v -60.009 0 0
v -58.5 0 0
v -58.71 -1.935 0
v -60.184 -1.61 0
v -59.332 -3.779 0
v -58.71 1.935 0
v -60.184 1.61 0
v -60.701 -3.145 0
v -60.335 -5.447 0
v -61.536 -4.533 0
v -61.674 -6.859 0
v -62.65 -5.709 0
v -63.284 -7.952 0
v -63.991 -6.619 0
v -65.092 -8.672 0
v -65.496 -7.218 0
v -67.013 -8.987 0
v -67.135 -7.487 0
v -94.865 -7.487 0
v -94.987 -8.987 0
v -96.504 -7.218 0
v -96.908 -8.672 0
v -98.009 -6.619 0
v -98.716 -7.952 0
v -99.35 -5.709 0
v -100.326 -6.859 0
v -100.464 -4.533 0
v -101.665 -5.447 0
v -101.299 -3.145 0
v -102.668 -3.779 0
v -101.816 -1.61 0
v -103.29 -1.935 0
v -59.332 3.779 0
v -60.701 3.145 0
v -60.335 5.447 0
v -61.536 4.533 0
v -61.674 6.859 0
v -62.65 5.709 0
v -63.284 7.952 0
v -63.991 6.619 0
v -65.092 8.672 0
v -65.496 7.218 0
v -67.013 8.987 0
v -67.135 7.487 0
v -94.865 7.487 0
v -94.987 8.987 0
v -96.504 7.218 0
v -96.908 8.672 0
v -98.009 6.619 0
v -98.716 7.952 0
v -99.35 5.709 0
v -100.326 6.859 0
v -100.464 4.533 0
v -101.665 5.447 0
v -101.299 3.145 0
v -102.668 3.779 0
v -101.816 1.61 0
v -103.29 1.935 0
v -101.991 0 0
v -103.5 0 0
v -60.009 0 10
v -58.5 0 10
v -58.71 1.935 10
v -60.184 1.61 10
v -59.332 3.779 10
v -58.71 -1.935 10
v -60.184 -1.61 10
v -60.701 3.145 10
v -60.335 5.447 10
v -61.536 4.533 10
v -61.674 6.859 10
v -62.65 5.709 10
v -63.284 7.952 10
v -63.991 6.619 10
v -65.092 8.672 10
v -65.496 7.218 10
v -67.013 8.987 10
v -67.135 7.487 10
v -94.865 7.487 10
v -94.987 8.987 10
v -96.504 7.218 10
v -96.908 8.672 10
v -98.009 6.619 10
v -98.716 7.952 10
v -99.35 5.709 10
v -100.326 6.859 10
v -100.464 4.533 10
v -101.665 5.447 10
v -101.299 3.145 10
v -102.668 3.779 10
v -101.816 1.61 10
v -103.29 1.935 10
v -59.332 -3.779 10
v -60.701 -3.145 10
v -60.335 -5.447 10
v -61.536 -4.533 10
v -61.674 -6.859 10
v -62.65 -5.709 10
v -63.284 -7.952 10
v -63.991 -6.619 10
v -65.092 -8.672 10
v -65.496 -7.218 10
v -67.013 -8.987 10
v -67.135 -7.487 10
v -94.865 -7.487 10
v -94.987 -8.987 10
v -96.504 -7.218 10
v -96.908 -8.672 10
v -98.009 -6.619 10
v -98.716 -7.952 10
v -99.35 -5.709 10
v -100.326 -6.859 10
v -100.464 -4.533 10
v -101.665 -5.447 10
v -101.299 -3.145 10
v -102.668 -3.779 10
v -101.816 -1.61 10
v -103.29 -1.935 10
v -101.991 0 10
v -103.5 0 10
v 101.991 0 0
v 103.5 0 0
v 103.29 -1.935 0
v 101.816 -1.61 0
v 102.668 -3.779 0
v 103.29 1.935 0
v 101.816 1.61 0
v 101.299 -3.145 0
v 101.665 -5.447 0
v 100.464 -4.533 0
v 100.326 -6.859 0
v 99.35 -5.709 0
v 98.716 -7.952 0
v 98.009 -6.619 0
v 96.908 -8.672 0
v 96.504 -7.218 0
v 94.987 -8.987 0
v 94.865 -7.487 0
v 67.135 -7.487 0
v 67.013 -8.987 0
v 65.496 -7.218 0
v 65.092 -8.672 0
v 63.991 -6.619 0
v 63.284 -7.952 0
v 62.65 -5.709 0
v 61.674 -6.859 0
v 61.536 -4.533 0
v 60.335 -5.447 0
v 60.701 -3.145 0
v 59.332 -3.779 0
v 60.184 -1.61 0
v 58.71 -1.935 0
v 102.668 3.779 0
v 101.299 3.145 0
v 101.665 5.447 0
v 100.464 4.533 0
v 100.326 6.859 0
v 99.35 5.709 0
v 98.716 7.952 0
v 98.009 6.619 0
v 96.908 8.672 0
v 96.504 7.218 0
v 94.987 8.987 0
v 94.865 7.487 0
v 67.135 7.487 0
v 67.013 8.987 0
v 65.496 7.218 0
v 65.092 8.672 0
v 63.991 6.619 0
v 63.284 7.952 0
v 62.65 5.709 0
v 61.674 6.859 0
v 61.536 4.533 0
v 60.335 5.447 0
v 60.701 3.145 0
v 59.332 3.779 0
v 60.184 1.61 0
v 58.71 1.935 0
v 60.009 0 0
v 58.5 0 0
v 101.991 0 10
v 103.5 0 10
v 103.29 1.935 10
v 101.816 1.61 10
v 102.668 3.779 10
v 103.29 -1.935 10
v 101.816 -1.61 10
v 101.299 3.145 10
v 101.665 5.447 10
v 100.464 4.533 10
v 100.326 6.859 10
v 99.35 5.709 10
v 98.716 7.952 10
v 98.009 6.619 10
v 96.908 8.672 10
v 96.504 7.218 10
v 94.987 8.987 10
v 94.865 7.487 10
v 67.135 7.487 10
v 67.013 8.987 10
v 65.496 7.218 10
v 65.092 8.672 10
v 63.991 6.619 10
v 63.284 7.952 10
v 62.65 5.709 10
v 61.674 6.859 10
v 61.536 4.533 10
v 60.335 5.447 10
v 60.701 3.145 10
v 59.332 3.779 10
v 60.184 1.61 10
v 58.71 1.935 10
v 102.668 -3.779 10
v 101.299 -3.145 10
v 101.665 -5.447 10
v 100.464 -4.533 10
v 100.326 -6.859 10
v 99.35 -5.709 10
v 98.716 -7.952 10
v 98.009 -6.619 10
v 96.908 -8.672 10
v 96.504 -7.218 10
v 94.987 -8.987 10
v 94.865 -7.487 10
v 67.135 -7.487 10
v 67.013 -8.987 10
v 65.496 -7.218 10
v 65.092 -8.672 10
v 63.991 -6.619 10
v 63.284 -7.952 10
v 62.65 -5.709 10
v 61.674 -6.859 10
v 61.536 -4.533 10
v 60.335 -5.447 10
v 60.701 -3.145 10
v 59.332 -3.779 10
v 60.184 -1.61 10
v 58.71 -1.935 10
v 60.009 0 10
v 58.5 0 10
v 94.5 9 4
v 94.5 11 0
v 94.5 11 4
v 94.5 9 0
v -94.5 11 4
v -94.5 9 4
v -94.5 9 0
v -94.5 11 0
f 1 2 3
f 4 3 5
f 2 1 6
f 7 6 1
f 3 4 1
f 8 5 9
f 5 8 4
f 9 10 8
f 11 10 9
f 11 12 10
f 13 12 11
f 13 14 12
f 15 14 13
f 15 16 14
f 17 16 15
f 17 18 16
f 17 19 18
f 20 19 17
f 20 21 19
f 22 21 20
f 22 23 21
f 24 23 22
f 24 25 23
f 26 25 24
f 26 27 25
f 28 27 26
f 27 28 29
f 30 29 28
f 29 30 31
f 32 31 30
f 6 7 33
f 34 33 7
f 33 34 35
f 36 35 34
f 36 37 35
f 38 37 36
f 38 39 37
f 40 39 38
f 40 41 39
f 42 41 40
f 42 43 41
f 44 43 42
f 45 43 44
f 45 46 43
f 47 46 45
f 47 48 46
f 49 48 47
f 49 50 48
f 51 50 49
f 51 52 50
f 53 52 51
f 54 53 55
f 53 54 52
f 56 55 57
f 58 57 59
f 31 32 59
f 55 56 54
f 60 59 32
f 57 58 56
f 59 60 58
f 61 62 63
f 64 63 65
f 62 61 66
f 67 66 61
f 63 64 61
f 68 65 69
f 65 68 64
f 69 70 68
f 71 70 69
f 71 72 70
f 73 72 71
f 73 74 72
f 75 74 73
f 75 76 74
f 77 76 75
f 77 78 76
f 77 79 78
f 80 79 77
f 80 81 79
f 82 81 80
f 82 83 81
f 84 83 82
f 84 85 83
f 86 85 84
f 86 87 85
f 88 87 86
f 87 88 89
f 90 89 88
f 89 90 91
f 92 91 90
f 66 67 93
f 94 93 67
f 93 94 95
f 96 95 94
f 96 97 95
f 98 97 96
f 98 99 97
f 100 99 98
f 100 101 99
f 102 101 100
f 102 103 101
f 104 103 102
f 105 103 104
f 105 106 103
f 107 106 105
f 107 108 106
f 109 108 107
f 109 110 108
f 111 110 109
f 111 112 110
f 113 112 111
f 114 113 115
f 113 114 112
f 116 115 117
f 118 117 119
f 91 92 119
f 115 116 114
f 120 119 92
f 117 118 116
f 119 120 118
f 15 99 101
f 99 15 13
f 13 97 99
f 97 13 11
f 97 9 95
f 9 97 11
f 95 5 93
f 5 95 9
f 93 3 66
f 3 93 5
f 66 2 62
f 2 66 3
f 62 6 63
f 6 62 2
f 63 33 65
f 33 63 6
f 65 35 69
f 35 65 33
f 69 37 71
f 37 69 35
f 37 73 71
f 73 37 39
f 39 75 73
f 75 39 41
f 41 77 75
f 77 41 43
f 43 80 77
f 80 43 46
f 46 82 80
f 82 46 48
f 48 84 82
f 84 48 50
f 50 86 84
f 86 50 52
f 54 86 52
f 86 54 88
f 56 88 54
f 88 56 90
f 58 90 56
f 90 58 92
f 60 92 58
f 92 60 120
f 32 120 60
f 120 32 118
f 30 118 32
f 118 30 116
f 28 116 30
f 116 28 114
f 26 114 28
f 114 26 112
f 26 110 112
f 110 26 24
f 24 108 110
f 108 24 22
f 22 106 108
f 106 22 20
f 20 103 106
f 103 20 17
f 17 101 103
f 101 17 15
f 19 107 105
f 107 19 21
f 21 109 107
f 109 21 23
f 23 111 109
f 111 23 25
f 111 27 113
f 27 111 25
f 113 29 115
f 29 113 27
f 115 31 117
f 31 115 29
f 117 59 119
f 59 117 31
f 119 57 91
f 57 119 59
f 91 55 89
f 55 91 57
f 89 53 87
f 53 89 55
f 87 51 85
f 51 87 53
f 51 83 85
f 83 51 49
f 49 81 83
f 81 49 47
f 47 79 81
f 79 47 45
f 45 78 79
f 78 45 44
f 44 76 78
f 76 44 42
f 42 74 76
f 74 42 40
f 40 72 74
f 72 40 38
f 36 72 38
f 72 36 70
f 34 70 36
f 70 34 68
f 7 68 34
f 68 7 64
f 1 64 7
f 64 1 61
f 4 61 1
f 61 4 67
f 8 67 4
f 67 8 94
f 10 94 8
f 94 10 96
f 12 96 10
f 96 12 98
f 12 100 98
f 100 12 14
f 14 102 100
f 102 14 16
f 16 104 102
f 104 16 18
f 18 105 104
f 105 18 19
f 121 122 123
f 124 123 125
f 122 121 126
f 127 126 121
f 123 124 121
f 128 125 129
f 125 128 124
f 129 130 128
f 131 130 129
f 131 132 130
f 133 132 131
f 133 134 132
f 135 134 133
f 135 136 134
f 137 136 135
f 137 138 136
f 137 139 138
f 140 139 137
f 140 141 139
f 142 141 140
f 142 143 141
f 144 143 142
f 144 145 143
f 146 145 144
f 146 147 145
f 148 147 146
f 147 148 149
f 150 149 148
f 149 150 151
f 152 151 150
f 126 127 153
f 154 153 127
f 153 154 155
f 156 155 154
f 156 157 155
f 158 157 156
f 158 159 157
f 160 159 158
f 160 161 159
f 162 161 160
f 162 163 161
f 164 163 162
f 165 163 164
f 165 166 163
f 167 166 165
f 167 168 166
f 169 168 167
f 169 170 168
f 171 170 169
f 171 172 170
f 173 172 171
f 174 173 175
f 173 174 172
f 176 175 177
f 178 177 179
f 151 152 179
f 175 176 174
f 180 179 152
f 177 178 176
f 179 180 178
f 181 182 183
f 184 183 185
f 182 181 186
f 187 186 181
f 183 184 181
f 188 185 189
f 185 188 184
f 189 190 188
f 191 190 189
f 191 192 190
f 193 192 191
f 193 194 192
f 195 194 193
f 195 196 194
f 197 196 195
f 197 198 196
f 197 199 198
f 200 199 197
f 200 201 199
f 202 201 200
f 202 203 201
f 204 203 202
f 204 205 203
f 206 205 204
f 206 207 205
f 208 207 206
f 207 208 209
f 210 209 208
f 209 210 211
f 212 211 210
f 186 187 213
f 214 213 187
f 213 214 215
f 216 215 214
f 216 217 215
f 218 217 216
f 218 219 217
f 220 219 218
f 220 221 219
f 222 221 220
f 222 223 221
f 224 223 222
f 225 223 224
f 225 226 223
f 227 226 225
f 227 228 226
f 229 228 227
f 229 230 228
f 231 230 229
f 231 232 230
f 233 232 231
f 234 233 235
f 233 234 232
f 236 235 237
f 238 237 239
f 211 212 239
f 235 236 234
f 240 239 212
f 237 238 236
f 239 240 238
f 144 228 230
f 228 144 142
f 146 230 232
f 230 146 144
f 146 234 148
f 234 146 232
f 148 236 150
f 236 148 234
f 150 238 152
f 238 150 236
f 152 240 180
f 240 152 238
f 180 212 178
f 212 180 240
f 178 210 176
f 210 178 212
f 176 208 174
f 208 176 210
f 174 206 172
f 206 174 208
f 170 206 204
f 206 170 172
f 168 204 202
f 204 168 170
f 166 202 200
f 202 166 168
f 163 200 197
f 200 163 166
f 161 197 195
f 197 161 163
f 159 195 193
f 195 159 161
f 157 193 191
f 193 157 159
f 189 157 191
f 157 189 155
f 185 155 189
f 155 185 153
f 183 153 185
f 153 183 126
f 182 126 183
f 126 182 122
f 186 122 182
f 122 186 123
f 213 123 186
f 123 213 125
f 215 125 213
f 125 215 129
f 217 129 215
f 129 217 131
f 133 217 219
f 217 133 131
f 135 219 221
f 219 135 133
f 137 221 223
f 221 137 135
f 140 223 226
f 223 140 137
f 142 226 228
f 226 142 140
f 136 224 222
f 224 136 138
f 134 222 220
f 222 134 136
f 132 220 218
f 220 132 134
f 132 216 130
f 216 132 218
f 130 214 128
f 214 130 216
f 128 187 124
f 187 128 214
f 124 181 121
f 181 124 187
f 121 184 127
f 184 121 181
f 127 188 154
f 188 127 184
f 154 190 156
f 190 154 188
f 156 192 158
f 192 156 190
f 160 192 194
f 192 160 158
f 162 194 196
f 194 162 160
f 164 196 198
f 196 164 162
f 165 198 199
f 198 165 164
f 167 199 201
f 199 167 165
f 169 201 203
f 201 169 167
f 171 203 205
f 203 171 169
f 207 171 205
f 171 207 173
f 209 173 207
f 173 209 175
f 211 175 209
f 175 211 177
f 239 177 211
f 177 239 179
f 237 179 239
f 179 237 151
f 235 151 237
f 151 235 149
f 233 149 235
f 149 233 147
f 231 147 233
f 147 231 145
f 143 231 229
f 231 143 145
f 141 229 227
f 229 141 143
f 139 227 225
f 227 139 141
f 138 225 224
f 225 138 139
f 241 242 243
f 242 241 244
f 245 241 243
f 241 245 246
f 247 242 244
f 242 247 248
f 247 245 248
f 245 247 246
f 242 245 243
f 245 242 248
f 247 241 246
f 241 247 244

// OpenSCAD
// two quasi-elliptical plugs separated by a long rod, fit for bridging
// the top two central plugs and supporting a CCFL.

r = 9; // radius of 9 on the plug cylinders
outerr = 7.5; // thickness of plug wrap
innerplug = 45;                     // inner plug width
cyldist = innerplug - r * 2;        // width between cylinder foci
outerplug = innerplug + 2 * outerr; // full plug width
distance = 102;                     // distance between extremal outer points
plugheight = 10; // arbitrary, enough to test FIXME

module plug2dsolid(){
  hull(){
    mirror([1, 0, 0]){
      translate([cyldist / 2, 0, 0]){
        circle(r);
      }
    }
    translate([cyldist / 2, 0, 0]){
      circle(r);
    }
  }
}

module plug2d(){
  difference(){
    plug2dsolid();
    offset(-1.5){
      plug2dsolid();
    }
  }  
}

module plug3d(){
  translate([-(outerplug / 2 + distance / 2), 0, 0]){
    linear_extrude(plugheight){
      plug2d();
    }
  }
}

plug3d();
mirror([1, 0, 0]){
  plug3d();
}

translate([-(distance / 2 + cyldist + r + outerr), r, 0]){
  cube([distance + (r + outerr + cyldist) * 2, 2, 4]);
}
